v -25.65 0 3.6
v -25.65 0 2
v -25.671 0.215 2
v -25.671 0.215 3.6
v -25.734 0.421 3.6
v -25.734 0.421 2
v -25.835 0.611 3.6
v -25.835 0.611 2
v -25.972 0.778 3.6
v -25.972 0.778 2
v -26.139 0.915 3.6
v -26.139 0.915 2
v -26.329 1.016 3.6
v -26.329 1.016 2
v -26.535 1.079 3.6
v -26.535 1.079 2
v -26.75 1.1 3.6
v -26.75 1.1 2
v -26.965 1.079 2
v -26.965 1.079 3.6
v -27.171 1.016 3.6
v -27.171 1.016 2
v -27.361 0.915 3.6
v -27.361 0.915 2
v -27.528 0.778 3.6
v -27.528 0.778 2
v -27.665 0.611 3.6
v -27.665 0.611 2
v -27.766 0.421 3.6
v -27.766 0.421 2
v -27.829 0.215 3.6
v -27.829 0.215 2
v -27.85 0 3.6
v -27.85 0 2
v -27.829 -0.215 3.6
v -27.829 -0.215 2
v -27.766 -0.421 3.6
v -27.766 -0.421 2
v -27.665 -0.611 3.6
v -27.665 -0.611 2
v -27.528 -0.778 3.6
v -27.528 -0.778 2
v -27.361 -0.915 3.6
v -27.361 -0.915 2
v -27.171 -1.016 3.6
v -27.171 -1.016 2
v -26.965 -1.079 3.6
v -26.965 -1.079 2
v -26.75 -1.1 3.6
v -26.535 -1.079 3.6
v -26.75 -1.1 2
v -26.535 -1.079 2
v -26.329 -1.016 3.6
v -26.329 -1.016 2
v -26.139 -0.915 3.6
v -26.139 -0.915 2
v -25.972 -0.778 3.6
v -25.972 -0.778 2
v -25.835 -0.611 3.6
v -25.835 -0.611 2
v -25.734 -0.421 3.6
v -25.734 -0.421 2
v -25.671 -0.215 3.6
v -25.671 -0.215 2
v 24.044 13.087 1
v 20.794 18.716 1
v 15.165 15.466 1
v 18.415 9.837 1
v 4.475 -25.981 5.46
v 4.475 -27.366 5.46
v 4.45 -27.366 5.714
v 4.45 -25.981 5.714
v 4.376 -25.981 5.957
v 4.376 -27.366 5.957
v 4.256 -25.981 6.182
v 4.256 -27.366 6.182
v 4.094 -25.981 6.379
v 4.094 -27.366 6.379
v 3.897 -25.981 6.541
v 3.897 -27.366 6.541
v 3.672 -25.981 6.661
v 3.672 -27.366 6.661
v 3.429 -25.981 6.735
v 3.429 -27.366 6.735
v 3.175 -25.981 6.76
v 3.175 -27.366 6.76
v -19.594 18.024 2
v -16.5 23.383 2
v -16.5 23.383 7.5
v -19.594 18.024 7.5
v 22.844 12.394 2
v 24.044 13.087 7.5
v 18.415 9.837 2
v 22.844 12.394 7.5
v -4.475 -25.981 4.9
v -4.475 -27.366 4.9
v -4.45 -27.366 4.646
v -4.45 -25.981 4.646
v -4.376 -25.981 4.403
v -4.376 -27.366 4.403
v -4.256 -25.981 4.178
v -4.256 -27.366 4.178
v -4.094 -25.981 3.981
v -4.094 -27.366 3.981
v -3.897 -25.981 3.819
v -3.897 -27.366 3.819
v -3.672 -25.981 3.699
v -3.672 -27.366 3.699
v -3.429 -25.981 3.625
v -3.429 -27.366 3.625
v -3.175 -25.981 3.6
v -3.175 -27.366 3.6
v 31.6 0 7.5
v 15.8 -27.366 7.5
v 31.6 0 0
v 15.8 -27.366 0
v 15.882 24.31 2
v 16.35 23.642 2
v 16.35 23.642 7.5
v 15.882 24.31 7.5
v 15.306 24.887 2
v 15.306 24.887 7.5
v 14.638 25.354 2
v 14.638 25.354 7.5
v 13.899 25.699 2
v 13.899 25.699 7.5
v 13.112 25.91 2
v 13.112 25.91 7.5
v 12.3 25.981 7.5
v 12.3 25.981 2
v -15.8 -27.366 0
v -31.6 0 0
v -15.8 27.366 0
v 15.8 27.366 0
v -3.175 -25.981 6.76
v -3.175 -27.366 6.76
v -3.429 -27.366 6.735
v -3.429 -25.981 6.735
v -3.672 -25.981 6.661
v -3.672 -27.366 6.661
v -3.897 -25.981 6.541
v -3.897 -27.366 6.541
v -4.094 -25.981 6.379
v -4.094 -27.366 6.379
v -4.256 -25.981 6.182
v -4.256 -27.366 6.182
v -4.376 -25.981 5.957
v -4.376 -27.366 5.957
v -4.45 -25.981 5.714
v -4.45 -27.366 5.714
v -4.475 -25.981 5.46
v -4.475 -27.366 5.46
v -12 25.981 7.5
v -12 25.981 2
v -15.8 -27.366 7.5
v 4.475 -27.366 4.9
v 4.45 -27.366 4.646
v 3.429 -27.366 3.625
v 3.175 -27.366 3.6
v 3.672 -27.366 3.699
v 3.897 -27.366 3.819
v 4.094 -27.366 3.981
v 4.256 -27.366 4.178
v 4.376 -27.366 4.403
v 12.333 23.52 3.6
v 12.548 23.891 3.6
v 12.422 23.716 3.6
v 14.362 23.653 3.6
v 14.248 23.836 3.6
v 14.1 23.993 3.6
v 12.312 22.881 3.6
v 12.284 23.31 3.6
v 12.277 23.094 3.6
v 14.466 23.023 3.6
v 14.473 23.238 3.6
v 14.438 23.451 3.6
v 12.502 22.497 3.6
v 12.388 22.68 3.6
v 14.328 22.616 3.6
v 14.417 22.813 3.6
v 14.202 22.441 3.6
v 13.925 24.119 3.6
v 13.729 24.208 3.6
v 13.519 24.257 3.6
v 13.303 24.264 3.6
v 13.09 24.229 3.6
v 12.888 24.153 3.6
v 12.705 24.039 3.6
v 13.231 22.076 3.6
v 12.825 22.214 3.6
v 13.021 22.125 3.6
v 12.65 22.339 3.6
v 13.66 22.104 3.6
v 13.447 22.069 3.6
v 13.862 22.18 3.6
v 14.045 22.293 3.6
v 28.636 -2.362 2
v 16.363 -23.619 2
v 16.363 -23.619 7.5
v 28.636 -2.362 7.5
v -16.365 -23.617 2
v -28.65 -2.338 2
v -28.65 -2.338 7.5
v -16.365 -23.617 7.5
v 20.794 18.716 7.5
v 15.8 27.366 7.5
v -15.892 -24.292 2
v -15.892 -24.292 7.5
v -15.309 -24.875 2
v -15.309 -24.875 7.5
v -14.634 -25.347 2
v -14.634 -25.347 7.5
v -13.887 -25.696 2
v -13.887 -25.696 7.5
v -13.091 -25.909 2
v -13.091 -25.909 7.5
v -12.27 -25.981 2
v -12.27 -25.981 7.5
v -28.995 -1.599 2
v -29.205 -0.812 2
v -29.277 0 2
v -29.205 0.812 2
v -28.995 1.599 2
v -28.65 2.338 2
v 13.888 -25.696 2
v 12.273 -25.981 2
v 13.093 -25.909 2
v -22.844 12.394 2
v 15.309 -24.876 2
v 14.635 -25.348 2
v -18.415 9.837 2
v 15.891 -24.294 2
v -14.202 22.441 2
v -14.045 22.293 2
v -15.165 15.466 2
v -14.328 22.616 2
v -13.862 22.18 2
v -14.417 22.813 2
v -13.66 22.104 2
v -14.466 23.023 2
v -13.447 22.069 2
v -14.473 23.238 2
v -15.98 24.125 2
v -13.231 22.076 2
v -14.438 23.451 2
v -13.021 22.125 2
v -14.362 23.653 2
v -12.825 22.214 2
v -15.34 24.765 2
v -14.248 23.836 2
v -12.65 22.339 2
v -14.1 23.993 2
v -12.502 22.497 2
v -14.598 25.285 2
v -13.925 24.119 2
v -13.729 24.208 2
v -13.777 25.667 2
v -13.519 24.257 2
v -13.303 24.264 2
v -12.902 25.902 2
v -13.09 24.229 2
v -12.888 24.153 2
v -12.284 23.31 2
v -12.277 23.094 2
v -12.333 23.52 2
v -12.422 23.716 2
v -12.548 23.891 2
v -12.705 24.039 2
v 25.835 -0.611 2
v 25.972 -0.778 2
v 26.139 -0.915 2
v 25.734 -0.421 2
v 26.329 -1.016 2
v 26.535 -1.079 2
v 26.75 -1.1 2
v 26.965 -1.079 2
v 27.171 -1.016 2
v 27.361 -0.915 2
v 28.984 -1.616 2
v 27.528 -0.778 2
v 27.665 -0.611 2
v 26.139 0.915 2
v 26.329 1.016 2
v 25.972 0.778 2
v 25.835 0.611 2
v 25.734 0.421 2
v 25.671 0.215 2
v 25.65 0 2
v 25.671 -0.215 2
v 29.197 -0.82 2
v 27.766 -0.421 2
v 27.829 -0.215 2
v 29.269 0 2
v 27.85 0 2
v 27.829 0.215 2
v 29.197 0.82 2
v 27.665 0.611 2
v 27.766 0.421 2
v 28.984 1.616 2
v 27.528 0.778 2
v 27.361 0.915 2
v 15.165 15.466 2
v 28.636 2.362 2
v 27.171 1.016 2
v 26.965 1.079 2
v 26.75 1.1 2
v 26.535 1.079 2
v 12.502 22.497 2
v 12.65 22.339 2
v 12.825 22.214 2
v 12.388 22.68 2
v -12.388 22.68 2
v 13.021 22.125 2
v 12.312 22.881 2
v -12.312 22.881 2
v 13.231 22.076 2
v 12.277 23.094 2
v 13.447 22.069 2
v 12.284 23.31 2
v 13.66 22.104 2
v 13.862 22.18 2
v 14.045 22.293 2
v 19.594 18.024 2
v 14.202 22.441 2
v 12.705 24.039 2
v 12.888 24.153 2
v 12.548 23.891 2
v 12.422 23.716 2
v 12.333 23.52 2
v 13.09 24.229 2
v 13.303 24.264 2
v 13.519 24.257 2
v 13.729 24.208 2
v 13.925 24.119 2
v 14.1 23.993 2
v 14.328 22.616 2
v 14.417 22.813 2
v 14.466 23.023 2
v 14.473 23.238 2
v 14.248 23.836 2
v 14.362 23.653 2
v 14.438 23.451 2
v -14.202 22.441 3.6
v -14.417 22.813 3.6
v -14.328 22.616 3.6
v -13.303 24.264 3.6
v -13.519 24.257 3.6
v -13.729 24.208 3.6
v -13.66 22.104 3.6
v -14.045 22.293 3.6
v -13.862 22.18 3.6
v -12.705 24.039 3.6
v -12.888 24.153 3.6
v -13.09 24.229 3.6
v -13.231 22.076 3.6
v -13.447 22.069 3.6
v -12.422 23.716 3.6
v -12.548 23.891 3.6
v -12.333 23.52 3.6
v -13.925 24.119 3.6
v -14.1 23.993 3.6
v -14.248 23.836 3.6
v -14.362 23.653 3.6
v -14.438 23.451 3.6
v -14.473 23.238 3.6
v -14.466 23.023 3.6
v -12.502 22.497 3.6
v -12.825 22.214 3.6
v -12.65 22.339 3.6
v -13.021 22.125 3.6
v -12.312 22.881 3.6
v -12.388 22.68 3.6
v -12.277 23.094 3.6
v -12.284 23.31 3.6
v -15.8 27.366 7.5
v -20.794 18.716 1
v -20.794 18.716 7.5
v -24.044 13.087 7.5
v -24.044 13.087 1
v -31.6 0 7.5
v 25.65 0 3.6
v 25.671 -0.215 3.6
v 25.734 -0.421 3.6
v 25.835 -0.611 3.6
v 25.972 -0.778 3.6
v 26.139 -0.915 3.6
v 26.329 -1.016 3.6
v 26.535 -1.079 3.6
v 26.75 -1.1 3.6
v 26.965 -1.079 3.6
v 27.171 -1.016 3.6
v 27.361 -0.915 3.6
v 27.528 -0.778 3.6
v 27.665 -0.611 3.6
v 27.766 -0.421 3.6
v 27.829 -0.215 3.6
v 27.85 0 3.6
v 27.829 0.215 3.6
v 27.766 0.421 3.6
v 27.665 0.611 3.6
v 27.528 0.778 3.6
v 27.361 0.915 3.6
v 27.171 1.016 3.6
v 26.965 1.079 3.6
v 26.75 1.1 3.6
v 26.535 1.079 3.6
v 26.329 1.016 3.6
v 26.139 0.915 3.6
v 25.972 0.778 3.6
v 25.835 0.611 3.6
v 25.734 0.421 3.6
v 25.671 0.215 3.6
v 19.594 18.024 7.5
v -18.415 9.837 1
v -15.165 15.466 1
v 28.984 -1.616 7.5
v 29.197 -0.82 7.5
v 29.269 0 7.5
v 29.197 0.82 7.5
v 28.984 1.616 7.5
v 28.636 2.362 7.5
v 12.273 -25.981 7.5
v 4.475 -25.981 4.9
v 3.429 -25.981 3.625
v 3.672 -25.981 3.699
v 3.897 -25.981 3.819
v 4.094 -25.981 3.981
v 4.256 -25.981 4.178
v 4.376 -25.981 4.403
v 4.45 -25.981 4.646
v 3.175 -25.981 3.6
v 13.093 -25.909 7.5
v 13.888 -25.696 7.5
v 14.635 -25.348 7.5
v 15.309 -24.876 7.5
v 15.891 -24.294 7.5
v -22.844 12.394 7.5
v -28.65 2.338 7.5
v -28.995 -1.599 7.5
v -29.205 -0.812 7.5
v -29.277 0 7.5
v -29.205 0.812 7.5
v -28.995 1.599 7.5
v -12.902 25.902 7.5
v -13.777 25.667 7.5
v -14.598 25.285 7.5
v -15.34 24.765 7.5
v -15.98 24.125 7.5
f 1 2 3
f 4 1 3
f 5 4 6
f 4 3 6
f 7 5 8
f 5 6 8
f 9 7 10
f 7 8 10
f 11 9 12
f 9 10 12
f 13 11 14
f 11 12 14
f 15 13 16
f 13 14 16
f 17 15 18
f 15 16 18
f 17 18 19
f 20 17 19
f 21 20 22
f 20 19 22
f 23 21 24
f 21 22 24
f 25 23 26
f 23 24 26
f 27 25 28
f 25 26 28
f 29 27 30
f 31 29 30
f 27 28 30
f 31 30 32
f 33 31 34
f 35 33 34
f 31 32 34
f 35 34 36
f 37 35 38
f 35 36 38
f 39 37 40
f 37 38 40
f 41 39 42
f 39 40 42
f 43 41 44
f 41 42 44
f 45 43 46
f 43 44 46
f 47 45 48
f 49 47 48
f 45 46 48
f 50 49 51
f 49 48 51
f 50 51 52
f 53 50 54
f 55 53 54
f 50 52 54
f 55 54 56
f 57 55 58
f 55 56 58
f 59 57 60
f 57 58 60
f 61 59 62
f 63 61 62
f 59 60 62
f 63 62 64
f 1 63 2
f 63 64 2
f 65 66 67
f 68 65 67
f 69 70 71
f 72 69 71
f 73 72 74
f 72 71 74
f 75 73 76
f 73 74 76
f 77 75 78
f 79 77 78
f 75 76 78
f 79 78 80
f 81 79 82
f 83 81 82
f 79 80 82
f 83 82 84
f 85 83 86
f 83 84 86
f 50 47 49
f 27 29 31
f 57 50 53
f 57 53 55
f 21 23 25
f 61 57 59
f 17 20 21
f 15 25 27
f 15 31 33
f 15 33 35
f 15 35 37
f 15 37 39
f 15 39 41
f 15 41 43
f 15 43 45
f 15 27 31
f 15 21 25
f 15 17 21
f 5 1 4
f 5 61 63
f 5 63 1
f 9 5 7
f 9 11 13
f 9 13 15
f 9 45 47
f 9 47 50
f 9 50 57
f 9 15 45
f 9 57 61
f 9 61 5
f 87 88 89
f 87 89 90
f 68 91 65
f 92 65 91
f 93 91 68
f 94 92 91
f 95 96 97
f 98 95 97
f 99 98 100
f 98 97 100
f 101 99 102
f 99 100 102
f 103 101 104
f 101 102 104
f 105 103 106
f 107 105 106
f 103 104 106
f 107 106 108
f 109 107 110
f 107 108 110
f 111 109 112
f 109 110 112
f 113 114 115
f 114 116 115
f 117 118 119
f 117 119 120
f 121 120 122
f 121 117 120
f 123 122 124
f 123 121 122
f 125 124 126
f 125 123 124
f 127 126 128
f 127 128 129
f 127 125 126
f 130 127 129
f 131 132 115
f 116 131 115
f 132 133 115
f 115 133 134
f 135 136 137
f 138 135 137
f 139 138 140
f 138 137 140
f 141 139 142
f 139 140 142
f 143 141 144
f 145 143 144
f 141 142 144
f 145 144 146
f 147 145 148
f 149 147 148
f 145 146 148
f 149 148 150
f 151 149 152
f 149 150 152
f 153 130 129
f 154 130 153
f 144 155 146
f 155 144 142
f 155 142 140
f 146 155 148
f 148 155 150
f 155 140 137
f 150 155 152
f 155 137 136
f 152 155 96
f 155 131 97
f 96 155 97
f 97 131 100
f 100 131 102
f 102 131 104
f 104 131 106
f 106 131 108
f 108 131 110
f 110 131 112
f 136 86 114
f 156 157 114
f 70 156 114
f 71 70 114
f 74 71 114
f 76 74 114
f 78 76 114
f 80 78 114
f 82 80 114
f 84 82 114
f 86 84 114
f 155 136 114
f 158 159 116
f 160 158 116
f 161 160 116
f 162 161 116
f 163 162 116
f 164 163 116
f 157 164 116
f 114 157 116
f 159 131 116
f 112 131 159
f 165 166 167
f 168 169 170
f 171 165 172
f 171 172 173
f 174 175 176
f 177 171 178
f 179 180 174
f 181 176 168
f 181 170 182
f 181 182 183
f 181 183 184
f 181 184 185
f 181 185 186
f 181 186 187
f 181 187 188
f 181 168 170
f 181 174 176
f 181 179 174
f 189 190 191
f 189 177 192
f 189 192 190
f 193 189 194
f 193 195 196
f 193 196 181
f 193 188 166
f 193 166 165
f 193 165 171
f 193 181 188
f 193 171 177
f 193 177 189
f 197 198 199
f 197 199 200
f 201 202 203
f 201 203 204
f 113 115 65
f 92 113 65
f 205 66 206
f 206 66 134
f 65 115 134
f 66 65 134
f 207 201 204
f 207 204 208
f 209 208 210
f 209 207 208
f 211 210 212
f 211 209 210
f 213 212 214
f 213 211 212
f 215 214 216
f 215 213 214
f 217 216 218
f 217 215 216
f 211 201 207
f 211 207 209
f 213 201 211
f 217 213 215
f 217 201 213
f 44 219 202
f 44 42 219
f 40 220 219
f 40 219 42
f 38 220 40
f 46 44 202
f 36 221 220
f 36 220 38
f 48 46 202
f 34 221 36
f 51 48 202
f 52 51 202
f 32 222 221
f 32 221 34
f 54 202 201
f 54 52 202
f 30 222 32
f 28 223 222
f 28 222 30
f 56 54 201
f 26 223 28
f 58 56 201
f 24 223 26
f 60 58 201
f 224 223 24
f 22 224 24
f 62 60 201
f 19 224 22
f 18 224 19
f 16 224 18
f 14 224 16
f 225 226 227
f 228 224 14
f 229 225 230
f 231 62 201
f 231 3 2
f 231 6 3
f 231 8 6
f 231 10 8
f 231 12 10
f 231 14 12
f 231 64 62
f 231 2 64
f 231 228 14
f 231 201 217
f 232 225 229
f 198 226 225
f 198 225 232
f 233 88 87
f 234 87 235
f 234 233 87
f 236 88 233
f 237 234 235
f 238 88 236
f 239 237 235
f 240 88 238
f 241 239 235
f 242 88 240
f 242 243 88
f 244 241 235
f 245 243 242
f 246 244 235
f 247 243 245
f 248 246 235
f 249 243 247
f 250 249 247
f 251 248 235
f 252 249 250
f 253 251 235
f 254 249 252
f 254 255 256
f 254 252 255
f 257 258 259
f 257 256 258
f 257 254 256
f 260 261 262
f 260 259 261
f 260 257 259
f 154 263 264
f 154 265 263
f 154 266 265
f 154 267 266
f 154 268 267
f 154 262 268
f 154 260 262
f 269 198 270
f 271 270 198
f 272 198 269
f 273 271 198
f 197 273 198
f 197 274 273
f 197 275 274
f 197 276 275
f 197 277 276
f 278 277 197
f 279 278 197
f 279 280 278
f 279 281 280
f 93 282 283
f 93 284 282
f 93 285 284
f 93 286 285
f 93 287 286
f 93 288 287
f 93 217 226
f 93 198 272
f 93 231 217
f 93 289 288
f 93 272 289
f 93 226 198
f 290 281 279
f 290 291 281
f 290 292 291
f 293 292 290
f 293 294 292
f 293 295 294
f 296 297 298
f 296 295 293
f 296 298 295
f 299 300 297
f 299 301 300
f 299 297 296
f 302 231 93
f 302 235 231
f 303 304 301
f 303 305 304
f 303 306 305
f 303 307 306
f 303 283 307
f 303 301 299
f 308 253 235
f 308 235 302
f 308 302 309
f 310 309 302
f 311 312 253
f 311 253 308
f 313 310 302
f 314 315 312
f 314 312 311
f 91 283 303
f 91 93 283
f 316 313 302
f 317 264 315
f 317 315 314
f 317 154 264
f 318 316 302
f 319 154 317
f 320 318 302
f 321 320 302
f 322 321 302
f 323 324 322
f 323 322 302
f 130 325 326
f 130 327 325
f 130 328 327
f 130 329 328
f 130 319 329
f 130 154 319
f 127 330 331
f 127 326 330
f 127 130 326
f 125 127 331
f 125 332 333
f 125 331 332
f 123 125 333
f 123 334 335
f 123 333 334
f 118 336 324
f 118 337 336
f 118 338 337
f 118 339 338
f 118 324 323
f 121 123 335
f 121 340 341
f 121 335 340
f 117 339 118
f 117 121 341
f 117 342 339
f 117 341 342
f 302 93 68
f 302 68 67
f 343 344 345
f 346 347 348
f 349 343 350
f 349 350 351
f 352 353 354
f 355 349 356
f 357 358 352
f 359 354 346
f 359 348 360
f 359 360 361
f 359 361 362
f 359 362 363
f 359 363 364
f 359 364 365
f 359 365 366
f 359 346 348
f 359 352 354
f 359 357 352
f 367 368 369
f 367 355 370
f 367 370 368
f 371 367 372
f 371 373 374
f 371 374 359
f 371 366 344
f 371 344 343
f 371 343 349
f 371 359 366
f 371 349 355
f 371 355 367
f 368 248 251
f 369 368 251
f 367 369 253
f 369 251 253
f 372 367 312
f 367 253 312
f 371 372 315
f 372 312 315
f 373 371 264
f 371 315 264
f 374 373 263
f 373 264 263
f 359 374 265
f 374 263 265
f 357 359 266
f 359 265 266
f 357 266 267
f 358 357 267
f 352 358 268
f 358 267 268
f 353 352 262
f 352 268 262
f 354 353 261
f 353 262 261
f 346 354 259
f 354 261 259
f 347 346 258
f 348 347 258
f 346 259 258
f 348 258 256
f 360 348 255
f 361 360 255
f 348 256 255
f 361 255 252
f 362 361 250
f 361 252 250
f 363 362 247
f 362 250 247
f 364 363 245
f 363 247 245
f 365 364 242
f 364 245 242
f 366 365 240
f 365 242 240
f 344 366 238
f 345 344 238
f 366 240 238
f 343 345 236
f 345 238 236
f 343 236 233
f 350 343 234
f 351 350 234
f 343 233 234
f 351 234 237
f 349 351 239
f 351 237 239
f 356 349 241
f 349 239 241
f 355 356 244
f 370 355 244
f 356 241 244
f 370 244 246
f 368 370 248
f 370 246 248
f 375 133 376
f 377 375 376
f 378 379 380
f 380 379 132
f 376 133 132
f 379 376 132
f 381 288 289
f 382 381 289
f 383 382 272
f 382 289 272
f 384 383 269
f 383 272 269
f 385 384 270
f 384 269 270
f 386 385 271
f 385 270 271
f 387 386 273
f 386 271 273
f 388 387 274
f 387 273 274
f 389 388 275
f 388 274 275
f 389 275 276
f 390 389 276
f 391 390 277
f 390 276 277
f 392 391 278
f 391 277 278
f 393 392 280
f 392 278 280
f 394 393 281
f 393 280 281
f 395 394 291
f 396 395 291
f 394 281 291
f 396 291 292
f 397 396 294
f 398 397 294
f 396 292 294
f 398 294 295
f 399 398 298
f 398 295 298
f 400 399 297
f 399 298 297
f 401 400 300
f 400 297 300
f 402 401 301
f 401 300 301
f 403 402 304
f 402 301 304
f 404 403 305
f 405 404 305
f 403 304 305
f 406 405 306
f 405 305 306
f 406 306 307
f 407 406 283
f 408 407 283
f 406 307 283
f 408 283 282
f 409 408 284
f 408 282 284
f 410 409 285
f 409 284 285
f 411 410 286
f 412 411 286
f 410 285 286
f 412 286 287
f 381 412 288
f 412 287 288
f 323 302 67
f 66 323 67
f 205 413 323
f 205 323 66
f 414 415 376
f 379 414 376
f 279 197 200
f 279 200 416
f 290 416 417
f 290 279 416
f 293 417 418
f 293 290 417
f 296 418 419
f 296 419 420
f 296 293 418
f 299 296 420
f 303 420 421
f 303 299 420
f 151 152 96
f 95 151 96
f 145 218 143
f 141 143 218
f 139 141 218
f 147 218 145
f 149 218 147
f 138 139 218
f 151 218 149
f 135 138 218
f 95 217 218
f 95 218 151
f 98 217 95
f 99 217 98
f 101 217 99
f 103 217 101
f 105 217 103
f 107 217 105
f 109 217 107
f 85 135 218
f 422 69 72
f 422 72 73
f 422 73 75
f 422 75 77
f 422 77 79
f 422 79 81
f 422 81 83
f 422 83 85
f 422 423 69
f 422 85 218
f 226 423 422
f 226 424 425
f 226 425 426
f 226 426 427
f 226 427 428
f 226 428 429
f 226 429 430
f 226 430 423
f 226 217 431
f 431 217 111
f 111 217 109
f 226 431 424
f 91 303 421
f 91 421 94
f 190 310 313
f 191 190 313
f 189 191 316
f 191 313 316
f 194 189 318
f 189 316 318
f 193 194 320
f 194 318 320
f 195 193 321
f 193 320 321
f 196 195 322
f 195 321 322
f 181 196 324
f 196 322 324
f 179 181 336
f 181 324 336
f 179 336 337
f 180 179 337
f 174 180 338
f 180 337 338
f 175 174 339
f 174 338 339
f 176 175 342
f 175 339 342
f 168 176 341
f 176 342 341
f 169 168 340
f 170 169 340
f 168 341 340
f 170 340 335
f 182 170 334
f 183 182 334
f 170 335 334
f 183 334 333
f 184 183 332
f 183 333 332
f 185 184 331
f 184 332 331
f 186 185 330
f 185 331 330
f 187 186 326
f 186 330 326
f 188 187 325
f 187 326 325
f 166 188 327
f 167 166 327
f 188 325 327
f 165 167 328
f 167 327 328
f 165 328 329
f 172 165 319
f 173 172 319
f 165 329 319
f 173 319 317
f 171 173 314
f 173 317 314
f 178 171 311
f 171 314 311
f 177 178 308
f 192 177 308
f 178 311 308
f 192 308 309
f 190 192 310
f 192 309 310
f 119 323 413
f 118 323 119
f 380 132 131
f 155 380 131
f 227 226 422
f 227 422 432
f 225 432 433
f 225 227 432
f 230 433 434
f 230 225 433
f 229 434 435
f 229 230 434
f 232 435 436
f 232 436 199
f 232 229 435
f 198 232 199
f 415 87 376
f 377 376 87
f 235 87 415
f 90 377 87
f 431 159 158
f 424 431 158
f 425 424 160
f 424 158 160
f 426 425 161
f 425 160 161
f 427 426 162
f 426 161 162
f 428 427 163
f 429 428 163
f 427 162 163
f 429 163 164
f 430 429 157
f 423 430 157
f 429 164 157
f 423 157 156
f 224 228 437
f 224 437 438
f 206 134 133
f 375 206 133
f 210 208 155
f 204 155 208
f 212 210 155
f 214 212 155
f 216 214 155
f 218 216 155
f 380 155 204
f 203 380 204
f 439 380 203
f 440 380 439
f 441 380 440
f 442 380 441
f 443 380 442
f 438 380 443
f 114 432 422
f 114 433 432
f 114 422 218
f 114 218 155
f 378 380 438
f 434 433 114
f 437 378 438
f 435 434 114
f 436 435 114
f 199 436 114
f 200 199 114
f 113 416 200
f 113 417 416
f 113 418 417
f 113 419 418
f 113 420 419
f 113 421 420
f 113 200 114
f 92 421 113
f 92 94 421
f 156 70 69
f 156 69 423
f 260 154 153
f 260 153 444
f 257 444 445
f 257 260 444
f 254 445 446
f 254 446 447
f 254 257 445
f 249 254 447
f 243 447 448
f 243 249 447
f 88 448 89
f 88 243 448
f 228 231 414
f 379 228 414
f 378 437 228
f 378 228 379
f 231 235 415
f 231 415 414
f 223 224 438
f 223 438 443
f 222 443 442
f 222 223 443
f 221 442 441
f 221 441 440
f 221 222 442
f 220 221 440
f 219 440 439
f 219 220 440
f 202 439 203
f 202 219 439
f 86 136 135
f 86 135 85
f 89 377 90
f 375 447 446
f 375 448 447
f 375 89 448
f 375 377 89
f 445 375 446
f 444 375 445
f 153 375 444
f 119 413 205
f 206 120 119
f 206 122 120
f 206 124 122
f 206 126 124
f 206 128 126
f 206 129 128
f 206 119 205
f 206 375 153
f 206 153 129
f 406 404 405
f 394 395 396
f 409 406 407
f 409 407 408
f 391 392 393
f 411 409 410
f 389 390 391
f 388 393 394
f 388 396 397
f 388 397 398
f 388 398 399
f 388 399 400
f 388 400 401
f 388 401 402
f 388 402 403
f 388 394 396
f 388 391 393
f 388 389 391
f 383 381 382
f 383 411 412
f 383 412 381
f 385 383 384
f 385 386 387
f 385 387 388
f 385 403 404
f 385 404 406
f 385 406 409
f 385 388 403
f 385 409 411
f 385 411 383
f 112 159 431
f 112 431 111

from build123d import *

# Parameters (mm, degrees)
PAD_DEPTH          = 2
PAD001_DEPTH       = 5.5
POCKET_DEPTH       = 6.5
POCKET001_DEPTH    = 5
SKETCH004_R        = 1.1
PAD002_DEPTH       = 1.6
POLARPATTERN_COUNT = 4
POLARPATTERN_ANGLE = 180


with BuildPart() as part:
    # Sketch → Pad (new body)
    with BuildSketch(Plane.XY):
        Polygon((-31.6, 0), (-15.8, -27.366403), (15.8, -27.366403), (31.6, 0), (15.8, 27.366403), (-15.8, 27.366403), align=None)
    extrude(amount=PAD_DEPTH)

    # Sketch001 (on Face8 of Pad) → Pad001 (join)
    with BuildSketch(Plane.XY.offset(2)):
        Polygon((-31.6, 0), (-15.8, -27.366403), (15.8, -27.366403), (31.6, 0), (15.8, 27.366403), (-15.8, 27.366403), align=None)
        with BuildLine():
            Line((-28.65, -2.338268), (-16.365, -23.616513))
            ThreePointArc((-16.365, -23.616513), (-14.634249, -25.347263), (-12.27, -25.980762))
            Line((-12.27, -25.980762), (12.273, -25.980762))
            ThreePointArc((12.273, -25.980762), (14.634651, -25.34796), (16.3635, -23.619111))
            Line((16.3635, -23.619111), (28.63635, -2.361911))
            ThreePointArc((28.63635, -2.361911), (29.269222, 0), (28.63635, 2.361911))
            Line((28.63635, 2.361911), (16.35, 23.642494))
            ThreePointArc((16.35, 23.642494), (14.638269, 25.354225), (12.3, 25.980762))
            Line((12.3, 25.980762), (-12, 25.980762))
            ThreePointArc((-12, 25.980762), (-14.598076, 25.28461), (-16.5, 23.382686))
            Line((-16.5, 23.382686), (-28.65, 2.338269))
            ThreePointArc((-28.65, 2.338269), (-29.276537, 0), (-28.65, -2.338268))
        make_face(mode=Mode.SUBTRACT)
    extrude(amount=PAD001_DEPTH)

    # Sketch002 (on Face11 of Pad001) → Pocket (cut)
    with BuildSketch(Plane.XY.offset(7.5)):
        Polygon((-24.04408, 13.087238), (-20.79408, 18.716403), (-15.164915, 15.466403), (-18.414915, 9.837238), align=None)
        Polygon((20.79408, 18.716403), (24.04408, 13.087238), (18.414915, 9.837238), (15.164915, 15.466403), align=None)
    extrude(amount=-POCKET_DEPTH, mode=Mode.SUBTRACT)

    # Sketch003 (on Face13 of Pocket) → Pocket001 (cut)
    with BuildSketch(Plane.XZ.offset(27.366403)):
        with BuildLine():
            Line((-3.175, 6.76), (3.175, 6.76))
            ThreePointArc((4.475, 5.46), (4.094239, 6.379239), (3.175, 6.76))
            Line((4.475, 5.46), (4.475, 4.9))
            ThreePointArc((3.175, 3.6), (4.094239, 3.980761), (4.475, 4.9))
            Line((3.175, 3.6), (-3.175, 3.6))
            ThreePointArc((-4.475, 4.9), (-4.094239, 3.980761), (-3.175, 3.6))
            Line((-4.475, 5.46), (-4.475, 4.9))
            ThreePointArc((-3.175, 6.76), (-4.094239, 6.379239), (-4.475, 5.46))
        make_face()
    extrude(amount=-POCKET001_DEPTH, mode=Mode.SUBTRACT)

    # Sketch004 (on Face16 of Pocket001) → Pad002 (join)
    with BuildSketch(Plane.XY.offset(2)):
        with Locations((-26.75, 0)):
            Circle(SKETCH004_R)
    pad002 = extrude(amount=PAD002_DEPTH)

    # PolarPattern: Pad002 ×4 about axis
    polarpattern_axis = Axis((0, 0, 2), (0, 0, -1))
    for i in range(1, POLARPATTERN_COUNT):
        add(pad002.rotate(polarpattern_axis, i * POLARPATTERN_ANGLE / (POLARPATTERN_COUNT - 1)))


solid = part.part
